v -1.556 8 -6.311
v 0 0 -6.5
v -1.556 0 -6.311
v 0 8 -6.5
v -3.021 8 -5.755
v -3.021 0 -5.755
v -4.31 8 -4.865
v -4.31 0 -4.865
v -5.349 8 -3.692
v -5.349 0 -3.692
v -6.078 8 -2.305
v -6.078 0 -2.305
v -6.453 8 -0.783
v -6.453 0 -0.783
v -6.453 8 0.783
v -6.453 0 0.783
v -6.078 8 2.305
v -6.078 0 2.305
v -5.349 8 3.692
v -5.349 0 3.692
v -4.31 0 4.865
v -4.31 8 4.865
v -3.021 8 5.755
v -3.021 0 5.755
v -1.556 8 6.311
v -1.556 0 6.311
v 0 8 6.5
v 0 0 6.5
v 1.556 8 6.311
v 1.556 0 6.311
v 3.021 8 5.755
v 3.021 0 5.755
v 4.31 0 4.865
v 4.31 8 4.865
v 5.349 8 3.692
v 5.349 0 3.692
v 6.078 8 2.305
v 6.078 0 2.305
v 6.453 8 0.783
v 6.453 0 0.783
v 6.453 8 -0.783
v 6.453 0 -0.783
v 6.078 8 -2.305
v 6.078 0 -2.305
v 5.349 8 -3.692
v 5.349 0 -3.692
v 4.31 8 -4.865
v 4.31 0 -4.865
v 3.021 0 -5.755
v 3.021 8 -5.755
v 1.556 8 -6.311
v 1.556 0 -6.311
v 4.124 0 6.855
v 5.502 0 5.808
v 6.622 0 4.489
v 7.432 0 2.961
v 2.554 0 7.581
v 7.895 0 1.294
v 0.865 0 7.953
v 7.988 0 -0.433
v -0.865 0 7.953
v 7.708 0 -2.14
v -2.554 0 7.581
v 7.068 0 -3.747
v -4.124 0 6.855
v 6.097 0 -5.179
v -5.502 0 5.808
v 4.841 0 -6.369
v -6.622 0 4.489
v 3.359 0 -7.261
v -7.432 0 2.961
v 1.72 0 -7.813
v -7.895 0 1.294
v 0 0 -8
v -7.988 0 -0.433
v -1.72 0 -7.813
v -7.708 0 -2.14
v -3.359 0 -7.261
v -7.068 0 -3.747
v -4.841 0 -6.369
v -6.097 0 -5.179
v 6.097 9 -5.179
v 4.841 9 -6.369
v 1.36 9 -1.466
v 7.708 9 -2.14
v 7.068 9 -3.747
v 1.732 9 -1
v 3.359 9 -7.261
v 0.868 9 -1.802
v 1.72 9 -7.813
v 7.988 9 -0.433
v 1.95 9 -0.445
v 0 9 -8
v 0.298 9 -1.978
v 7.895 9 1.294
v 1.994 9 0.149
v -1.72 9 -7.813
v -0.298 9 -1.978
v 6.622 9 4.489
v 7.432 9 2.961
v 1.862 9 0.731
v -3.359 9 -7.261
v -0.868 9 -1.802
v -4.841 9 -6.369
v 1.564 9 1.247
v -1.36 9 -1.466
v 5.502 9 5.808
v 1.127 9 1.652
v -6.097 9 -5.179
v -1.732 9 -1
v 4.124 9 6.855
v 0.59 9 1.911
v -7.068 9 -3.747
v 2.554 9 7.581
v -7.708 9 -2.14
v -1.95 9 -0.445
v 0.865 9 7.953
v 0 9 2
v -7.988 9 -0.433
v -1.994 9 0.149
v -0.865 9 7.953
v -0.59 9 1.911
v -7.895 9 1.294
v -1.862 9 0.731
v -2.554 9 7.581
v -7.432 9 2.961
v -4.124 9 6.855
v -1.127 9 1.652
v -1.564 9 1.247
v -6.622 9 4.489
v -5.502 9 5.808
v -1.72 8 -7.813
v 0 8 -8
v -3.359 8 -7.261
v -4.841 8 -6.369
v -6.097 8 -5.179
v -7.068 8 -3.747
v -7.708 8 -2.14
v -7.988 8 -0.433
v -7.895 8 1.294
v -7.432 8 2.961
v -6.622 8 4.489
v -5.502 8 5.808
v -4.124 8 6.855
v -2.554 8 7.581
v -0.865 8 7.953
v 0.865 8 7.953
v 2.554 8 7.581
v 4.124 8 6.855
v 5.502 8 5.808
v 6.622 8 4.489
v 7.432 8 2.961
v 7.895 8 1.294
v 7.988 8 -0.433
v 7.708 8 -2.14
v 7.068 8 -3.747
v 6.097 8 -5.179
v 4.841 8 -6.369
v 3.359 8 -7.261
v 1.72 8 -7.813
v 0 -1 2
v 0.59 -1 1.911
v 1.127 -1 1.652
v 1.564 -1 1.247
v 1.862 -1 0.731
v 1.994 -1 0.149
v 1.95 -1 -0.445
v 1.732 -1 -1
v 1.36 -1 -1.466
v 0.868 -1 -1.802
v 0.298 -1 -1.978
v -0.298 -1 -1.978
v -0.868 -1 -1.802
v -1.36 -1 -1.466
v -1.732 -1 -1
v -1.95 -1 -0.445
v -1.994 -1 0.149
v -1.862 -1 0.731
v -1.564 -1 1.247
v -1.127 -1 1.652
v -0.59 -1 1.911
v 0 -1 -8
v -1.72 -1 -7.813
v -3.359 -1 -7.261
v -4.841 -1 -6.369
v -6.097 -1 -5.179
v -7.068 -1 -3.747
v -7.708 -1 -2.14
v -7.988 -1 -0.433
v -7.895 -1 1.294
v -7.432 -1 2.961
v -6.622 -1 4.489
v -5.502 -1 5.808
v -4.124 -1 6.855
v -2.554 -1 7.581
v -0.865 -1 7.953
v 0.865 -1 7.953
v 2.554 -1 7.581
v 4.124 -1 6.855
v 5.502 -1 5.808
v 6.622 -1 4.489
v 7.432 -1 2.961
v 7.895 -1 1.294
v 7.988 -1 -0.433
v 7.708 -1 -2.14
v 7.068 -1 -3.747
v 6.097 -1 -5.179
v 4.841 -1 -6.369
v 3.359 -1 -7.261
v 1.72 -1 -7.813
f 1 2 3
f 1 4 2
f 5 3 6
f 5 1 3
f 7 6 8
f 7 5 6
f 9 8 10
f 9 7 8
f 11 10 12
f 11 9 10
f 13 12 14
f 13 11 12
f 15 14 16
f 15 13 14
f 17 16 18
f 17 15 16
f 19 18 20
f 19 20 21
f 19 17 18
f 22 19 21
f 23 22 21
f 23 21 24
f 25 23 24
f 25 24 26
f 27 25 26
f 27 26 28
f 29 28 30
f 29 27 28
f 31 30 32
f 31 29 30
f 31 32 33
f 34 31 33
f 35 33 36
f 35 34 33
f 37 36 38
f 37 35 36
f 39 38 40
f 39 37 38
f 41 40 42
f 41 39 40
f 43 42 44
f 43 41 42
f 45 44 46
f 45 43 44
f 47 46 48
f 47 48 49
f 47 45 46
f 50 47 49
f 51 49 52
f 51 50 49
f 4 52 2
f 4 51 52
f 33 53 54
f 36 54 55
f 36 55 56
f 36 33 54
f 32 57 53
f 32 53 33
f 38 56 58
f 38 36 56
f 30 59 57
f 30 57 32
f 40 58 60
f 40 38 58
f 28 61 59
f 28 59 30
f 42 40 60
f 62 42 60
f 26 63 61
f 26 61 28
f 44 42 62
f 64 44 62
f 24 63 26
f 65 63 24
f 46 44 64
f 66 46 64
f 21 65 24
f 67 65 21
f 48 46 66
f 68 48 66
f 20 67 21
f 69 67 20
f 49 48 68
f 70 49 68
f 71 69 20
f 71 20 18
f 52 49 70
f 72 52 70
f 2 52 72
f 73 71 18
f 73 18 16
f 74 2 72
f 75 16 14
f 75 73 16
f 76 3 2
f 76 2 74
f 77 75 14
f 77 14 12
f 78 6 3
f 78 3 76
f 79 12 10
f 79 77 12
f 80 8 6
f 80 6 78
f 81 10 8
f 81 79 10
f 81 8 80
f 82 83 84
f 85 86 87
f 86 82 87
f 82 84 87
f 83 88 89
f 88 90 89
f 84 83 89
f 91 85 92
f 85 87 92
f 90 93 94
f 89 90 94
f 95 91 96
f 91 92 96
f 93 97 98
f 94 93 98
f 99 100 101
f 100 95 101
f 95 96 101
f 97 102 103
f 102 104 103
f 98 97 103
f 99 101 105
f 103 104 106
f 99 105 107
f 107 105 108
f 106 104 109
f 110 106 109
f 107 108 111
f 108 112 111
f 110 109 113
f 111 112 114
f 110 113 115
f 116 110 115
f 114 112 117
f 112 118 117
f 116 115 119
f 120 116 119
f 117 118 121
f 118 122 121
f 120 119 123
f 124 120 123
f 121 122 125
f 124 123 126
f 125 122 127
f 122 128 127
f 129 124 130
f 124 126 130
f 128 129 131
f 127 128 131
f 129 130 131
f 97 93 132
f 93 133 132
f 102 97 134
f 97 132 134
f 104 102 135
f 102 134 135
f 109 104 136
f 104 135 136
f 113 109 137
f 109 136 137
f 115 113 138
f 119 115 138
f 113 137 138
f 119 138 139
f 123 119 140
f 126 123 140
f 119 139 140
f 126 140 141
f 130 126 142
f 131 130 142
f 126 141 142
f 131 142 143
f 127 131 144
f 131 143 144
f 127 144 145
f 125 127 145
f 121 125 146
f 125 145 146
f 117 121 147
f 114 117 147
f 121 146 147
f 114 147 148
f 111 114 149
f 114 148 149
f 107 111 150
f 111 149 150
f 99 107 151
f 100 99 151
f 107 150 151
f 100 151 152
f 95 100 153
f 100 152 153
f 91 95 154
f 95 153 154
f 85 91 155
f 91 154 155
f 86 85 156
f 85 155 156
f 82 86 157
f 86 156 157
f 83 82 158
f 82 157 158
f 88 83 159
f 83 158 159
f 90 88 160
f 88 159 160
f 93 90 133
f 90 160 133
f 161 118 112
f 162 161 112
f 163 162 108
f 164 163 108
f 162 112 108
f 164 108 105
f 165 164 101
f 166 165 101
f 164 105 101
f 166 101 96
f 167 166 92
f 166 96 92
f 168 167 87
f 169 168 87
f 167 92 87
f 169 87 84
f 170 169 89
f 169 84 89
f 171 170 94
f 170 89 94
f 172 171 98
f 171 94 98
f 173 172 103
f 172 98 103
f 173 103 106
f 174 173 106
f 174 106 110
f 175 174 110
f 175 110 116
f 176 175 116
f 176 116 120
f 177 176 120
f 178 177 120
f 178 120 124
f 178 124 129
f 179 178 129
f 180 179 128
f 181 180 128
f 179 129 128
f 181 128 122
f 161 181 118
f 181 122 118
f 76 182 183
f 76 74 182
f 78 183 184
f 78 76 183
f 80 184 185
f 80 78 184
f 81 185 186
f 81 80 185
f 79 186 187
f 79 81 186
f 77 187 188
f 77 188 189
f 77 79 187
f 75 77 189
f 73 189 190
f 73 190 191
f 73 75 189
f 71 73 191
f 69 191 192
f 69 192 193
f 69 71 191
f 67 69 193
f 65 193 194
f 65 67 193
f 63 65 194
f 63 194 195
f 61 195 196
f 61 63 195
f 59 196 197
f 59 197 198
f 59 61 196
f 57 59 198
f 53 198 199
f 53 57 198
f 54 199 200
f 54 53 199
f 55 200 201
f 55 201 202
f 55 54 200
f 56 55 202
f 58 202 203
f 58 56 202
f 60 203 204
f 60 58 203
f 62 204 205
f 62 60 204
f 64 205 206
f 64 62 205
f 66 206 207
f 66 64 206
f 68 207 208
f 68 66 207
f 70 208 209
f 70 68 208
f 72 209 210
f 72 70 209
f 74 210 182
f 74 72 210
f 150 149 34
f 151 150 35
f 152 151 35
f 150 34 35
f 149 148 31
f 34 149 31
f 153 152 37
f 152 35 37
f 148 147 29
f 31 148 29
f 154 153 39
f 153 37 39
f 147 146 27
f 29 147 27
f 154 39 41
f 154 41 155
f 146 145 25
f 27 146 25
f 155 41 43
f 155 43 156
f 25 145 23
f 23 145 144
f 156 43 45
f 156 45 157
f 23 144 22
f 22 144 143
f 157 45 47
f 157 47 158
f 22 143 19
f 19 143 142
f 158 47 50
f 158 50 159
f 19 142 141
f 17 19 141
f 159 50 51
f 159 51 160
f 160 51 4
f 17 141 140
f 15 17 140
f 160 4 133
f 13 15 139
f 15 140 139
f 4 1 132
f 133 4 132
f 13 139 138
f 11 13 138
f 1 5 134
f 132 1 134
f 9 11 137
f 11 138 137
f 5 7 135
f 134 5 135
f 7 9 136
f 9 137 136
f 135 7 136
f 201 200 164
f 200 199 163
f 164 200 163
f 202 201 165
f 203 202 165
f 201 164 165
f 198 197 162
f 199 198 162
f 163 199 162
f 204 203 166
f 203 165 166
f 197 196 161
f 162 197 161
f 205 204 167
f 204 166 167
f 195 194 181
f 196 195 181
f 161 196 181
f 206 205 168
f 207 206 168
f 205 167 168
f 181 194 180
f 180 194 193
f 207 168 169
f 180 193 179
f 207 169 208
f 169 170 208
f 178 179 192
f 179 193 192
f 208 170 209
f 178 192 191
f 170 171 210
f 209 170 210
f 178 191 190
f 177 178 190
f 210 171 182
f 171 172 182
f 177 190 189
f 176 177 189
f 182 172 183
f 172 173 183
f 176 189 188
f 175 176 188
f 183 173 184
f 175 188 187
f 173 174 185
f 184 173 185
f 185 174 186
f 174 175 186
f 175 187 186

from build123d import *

# Parameters (mm, degrees)
SKETCH2_W          = 6.5
SKETCH2_H          = 8
SKETCH2_W_2        = 8
SKETCH2_H_2        = 1
SKETCH4_R          = 2
CUT_EXTRUDE1_DEPTH = 10


with BuildPart() as part:
    # Sketch2 → Revolve1 (revolve)
    with BuildSketch(Plane.XY, mode=Mode.PRIVATE) as revolve1_sk:
        Polygon((-6.5, 8), (0, 8), (0, 9), (-8, 9), (-8, 8), align=None)
        with Locations((-3.25, 4)):
            Rectangle(SKETCH2_W, SKETCH2_H)
        with Locations((-4, -0.5)):
            Rectangle(SKETCH2_W_2, SKETCH2_H_2)
    revolve(revolve1_sk.sketch.rotate(Axis((0, 0, 0), (0, 1, 0)), 270), axis=Axis((0, 0, 0), (0, 1, 0)))

    # Sketch4 → Cut-Extrude1 (cut)
    with BuildSketch(Plane(origin=(0, 9, 0), x_dir=(1, 0, 0), z_dir=(0, 1, 0))):
        with Locations(Location((0, 0, 0), (0, 0, 270))):
            Circle(SKETCH4_R)
    extrude(amount=-CUT_EXTRUDE1_DEPTH, mode=Mode.SUBTRACT)


solid = part.part
